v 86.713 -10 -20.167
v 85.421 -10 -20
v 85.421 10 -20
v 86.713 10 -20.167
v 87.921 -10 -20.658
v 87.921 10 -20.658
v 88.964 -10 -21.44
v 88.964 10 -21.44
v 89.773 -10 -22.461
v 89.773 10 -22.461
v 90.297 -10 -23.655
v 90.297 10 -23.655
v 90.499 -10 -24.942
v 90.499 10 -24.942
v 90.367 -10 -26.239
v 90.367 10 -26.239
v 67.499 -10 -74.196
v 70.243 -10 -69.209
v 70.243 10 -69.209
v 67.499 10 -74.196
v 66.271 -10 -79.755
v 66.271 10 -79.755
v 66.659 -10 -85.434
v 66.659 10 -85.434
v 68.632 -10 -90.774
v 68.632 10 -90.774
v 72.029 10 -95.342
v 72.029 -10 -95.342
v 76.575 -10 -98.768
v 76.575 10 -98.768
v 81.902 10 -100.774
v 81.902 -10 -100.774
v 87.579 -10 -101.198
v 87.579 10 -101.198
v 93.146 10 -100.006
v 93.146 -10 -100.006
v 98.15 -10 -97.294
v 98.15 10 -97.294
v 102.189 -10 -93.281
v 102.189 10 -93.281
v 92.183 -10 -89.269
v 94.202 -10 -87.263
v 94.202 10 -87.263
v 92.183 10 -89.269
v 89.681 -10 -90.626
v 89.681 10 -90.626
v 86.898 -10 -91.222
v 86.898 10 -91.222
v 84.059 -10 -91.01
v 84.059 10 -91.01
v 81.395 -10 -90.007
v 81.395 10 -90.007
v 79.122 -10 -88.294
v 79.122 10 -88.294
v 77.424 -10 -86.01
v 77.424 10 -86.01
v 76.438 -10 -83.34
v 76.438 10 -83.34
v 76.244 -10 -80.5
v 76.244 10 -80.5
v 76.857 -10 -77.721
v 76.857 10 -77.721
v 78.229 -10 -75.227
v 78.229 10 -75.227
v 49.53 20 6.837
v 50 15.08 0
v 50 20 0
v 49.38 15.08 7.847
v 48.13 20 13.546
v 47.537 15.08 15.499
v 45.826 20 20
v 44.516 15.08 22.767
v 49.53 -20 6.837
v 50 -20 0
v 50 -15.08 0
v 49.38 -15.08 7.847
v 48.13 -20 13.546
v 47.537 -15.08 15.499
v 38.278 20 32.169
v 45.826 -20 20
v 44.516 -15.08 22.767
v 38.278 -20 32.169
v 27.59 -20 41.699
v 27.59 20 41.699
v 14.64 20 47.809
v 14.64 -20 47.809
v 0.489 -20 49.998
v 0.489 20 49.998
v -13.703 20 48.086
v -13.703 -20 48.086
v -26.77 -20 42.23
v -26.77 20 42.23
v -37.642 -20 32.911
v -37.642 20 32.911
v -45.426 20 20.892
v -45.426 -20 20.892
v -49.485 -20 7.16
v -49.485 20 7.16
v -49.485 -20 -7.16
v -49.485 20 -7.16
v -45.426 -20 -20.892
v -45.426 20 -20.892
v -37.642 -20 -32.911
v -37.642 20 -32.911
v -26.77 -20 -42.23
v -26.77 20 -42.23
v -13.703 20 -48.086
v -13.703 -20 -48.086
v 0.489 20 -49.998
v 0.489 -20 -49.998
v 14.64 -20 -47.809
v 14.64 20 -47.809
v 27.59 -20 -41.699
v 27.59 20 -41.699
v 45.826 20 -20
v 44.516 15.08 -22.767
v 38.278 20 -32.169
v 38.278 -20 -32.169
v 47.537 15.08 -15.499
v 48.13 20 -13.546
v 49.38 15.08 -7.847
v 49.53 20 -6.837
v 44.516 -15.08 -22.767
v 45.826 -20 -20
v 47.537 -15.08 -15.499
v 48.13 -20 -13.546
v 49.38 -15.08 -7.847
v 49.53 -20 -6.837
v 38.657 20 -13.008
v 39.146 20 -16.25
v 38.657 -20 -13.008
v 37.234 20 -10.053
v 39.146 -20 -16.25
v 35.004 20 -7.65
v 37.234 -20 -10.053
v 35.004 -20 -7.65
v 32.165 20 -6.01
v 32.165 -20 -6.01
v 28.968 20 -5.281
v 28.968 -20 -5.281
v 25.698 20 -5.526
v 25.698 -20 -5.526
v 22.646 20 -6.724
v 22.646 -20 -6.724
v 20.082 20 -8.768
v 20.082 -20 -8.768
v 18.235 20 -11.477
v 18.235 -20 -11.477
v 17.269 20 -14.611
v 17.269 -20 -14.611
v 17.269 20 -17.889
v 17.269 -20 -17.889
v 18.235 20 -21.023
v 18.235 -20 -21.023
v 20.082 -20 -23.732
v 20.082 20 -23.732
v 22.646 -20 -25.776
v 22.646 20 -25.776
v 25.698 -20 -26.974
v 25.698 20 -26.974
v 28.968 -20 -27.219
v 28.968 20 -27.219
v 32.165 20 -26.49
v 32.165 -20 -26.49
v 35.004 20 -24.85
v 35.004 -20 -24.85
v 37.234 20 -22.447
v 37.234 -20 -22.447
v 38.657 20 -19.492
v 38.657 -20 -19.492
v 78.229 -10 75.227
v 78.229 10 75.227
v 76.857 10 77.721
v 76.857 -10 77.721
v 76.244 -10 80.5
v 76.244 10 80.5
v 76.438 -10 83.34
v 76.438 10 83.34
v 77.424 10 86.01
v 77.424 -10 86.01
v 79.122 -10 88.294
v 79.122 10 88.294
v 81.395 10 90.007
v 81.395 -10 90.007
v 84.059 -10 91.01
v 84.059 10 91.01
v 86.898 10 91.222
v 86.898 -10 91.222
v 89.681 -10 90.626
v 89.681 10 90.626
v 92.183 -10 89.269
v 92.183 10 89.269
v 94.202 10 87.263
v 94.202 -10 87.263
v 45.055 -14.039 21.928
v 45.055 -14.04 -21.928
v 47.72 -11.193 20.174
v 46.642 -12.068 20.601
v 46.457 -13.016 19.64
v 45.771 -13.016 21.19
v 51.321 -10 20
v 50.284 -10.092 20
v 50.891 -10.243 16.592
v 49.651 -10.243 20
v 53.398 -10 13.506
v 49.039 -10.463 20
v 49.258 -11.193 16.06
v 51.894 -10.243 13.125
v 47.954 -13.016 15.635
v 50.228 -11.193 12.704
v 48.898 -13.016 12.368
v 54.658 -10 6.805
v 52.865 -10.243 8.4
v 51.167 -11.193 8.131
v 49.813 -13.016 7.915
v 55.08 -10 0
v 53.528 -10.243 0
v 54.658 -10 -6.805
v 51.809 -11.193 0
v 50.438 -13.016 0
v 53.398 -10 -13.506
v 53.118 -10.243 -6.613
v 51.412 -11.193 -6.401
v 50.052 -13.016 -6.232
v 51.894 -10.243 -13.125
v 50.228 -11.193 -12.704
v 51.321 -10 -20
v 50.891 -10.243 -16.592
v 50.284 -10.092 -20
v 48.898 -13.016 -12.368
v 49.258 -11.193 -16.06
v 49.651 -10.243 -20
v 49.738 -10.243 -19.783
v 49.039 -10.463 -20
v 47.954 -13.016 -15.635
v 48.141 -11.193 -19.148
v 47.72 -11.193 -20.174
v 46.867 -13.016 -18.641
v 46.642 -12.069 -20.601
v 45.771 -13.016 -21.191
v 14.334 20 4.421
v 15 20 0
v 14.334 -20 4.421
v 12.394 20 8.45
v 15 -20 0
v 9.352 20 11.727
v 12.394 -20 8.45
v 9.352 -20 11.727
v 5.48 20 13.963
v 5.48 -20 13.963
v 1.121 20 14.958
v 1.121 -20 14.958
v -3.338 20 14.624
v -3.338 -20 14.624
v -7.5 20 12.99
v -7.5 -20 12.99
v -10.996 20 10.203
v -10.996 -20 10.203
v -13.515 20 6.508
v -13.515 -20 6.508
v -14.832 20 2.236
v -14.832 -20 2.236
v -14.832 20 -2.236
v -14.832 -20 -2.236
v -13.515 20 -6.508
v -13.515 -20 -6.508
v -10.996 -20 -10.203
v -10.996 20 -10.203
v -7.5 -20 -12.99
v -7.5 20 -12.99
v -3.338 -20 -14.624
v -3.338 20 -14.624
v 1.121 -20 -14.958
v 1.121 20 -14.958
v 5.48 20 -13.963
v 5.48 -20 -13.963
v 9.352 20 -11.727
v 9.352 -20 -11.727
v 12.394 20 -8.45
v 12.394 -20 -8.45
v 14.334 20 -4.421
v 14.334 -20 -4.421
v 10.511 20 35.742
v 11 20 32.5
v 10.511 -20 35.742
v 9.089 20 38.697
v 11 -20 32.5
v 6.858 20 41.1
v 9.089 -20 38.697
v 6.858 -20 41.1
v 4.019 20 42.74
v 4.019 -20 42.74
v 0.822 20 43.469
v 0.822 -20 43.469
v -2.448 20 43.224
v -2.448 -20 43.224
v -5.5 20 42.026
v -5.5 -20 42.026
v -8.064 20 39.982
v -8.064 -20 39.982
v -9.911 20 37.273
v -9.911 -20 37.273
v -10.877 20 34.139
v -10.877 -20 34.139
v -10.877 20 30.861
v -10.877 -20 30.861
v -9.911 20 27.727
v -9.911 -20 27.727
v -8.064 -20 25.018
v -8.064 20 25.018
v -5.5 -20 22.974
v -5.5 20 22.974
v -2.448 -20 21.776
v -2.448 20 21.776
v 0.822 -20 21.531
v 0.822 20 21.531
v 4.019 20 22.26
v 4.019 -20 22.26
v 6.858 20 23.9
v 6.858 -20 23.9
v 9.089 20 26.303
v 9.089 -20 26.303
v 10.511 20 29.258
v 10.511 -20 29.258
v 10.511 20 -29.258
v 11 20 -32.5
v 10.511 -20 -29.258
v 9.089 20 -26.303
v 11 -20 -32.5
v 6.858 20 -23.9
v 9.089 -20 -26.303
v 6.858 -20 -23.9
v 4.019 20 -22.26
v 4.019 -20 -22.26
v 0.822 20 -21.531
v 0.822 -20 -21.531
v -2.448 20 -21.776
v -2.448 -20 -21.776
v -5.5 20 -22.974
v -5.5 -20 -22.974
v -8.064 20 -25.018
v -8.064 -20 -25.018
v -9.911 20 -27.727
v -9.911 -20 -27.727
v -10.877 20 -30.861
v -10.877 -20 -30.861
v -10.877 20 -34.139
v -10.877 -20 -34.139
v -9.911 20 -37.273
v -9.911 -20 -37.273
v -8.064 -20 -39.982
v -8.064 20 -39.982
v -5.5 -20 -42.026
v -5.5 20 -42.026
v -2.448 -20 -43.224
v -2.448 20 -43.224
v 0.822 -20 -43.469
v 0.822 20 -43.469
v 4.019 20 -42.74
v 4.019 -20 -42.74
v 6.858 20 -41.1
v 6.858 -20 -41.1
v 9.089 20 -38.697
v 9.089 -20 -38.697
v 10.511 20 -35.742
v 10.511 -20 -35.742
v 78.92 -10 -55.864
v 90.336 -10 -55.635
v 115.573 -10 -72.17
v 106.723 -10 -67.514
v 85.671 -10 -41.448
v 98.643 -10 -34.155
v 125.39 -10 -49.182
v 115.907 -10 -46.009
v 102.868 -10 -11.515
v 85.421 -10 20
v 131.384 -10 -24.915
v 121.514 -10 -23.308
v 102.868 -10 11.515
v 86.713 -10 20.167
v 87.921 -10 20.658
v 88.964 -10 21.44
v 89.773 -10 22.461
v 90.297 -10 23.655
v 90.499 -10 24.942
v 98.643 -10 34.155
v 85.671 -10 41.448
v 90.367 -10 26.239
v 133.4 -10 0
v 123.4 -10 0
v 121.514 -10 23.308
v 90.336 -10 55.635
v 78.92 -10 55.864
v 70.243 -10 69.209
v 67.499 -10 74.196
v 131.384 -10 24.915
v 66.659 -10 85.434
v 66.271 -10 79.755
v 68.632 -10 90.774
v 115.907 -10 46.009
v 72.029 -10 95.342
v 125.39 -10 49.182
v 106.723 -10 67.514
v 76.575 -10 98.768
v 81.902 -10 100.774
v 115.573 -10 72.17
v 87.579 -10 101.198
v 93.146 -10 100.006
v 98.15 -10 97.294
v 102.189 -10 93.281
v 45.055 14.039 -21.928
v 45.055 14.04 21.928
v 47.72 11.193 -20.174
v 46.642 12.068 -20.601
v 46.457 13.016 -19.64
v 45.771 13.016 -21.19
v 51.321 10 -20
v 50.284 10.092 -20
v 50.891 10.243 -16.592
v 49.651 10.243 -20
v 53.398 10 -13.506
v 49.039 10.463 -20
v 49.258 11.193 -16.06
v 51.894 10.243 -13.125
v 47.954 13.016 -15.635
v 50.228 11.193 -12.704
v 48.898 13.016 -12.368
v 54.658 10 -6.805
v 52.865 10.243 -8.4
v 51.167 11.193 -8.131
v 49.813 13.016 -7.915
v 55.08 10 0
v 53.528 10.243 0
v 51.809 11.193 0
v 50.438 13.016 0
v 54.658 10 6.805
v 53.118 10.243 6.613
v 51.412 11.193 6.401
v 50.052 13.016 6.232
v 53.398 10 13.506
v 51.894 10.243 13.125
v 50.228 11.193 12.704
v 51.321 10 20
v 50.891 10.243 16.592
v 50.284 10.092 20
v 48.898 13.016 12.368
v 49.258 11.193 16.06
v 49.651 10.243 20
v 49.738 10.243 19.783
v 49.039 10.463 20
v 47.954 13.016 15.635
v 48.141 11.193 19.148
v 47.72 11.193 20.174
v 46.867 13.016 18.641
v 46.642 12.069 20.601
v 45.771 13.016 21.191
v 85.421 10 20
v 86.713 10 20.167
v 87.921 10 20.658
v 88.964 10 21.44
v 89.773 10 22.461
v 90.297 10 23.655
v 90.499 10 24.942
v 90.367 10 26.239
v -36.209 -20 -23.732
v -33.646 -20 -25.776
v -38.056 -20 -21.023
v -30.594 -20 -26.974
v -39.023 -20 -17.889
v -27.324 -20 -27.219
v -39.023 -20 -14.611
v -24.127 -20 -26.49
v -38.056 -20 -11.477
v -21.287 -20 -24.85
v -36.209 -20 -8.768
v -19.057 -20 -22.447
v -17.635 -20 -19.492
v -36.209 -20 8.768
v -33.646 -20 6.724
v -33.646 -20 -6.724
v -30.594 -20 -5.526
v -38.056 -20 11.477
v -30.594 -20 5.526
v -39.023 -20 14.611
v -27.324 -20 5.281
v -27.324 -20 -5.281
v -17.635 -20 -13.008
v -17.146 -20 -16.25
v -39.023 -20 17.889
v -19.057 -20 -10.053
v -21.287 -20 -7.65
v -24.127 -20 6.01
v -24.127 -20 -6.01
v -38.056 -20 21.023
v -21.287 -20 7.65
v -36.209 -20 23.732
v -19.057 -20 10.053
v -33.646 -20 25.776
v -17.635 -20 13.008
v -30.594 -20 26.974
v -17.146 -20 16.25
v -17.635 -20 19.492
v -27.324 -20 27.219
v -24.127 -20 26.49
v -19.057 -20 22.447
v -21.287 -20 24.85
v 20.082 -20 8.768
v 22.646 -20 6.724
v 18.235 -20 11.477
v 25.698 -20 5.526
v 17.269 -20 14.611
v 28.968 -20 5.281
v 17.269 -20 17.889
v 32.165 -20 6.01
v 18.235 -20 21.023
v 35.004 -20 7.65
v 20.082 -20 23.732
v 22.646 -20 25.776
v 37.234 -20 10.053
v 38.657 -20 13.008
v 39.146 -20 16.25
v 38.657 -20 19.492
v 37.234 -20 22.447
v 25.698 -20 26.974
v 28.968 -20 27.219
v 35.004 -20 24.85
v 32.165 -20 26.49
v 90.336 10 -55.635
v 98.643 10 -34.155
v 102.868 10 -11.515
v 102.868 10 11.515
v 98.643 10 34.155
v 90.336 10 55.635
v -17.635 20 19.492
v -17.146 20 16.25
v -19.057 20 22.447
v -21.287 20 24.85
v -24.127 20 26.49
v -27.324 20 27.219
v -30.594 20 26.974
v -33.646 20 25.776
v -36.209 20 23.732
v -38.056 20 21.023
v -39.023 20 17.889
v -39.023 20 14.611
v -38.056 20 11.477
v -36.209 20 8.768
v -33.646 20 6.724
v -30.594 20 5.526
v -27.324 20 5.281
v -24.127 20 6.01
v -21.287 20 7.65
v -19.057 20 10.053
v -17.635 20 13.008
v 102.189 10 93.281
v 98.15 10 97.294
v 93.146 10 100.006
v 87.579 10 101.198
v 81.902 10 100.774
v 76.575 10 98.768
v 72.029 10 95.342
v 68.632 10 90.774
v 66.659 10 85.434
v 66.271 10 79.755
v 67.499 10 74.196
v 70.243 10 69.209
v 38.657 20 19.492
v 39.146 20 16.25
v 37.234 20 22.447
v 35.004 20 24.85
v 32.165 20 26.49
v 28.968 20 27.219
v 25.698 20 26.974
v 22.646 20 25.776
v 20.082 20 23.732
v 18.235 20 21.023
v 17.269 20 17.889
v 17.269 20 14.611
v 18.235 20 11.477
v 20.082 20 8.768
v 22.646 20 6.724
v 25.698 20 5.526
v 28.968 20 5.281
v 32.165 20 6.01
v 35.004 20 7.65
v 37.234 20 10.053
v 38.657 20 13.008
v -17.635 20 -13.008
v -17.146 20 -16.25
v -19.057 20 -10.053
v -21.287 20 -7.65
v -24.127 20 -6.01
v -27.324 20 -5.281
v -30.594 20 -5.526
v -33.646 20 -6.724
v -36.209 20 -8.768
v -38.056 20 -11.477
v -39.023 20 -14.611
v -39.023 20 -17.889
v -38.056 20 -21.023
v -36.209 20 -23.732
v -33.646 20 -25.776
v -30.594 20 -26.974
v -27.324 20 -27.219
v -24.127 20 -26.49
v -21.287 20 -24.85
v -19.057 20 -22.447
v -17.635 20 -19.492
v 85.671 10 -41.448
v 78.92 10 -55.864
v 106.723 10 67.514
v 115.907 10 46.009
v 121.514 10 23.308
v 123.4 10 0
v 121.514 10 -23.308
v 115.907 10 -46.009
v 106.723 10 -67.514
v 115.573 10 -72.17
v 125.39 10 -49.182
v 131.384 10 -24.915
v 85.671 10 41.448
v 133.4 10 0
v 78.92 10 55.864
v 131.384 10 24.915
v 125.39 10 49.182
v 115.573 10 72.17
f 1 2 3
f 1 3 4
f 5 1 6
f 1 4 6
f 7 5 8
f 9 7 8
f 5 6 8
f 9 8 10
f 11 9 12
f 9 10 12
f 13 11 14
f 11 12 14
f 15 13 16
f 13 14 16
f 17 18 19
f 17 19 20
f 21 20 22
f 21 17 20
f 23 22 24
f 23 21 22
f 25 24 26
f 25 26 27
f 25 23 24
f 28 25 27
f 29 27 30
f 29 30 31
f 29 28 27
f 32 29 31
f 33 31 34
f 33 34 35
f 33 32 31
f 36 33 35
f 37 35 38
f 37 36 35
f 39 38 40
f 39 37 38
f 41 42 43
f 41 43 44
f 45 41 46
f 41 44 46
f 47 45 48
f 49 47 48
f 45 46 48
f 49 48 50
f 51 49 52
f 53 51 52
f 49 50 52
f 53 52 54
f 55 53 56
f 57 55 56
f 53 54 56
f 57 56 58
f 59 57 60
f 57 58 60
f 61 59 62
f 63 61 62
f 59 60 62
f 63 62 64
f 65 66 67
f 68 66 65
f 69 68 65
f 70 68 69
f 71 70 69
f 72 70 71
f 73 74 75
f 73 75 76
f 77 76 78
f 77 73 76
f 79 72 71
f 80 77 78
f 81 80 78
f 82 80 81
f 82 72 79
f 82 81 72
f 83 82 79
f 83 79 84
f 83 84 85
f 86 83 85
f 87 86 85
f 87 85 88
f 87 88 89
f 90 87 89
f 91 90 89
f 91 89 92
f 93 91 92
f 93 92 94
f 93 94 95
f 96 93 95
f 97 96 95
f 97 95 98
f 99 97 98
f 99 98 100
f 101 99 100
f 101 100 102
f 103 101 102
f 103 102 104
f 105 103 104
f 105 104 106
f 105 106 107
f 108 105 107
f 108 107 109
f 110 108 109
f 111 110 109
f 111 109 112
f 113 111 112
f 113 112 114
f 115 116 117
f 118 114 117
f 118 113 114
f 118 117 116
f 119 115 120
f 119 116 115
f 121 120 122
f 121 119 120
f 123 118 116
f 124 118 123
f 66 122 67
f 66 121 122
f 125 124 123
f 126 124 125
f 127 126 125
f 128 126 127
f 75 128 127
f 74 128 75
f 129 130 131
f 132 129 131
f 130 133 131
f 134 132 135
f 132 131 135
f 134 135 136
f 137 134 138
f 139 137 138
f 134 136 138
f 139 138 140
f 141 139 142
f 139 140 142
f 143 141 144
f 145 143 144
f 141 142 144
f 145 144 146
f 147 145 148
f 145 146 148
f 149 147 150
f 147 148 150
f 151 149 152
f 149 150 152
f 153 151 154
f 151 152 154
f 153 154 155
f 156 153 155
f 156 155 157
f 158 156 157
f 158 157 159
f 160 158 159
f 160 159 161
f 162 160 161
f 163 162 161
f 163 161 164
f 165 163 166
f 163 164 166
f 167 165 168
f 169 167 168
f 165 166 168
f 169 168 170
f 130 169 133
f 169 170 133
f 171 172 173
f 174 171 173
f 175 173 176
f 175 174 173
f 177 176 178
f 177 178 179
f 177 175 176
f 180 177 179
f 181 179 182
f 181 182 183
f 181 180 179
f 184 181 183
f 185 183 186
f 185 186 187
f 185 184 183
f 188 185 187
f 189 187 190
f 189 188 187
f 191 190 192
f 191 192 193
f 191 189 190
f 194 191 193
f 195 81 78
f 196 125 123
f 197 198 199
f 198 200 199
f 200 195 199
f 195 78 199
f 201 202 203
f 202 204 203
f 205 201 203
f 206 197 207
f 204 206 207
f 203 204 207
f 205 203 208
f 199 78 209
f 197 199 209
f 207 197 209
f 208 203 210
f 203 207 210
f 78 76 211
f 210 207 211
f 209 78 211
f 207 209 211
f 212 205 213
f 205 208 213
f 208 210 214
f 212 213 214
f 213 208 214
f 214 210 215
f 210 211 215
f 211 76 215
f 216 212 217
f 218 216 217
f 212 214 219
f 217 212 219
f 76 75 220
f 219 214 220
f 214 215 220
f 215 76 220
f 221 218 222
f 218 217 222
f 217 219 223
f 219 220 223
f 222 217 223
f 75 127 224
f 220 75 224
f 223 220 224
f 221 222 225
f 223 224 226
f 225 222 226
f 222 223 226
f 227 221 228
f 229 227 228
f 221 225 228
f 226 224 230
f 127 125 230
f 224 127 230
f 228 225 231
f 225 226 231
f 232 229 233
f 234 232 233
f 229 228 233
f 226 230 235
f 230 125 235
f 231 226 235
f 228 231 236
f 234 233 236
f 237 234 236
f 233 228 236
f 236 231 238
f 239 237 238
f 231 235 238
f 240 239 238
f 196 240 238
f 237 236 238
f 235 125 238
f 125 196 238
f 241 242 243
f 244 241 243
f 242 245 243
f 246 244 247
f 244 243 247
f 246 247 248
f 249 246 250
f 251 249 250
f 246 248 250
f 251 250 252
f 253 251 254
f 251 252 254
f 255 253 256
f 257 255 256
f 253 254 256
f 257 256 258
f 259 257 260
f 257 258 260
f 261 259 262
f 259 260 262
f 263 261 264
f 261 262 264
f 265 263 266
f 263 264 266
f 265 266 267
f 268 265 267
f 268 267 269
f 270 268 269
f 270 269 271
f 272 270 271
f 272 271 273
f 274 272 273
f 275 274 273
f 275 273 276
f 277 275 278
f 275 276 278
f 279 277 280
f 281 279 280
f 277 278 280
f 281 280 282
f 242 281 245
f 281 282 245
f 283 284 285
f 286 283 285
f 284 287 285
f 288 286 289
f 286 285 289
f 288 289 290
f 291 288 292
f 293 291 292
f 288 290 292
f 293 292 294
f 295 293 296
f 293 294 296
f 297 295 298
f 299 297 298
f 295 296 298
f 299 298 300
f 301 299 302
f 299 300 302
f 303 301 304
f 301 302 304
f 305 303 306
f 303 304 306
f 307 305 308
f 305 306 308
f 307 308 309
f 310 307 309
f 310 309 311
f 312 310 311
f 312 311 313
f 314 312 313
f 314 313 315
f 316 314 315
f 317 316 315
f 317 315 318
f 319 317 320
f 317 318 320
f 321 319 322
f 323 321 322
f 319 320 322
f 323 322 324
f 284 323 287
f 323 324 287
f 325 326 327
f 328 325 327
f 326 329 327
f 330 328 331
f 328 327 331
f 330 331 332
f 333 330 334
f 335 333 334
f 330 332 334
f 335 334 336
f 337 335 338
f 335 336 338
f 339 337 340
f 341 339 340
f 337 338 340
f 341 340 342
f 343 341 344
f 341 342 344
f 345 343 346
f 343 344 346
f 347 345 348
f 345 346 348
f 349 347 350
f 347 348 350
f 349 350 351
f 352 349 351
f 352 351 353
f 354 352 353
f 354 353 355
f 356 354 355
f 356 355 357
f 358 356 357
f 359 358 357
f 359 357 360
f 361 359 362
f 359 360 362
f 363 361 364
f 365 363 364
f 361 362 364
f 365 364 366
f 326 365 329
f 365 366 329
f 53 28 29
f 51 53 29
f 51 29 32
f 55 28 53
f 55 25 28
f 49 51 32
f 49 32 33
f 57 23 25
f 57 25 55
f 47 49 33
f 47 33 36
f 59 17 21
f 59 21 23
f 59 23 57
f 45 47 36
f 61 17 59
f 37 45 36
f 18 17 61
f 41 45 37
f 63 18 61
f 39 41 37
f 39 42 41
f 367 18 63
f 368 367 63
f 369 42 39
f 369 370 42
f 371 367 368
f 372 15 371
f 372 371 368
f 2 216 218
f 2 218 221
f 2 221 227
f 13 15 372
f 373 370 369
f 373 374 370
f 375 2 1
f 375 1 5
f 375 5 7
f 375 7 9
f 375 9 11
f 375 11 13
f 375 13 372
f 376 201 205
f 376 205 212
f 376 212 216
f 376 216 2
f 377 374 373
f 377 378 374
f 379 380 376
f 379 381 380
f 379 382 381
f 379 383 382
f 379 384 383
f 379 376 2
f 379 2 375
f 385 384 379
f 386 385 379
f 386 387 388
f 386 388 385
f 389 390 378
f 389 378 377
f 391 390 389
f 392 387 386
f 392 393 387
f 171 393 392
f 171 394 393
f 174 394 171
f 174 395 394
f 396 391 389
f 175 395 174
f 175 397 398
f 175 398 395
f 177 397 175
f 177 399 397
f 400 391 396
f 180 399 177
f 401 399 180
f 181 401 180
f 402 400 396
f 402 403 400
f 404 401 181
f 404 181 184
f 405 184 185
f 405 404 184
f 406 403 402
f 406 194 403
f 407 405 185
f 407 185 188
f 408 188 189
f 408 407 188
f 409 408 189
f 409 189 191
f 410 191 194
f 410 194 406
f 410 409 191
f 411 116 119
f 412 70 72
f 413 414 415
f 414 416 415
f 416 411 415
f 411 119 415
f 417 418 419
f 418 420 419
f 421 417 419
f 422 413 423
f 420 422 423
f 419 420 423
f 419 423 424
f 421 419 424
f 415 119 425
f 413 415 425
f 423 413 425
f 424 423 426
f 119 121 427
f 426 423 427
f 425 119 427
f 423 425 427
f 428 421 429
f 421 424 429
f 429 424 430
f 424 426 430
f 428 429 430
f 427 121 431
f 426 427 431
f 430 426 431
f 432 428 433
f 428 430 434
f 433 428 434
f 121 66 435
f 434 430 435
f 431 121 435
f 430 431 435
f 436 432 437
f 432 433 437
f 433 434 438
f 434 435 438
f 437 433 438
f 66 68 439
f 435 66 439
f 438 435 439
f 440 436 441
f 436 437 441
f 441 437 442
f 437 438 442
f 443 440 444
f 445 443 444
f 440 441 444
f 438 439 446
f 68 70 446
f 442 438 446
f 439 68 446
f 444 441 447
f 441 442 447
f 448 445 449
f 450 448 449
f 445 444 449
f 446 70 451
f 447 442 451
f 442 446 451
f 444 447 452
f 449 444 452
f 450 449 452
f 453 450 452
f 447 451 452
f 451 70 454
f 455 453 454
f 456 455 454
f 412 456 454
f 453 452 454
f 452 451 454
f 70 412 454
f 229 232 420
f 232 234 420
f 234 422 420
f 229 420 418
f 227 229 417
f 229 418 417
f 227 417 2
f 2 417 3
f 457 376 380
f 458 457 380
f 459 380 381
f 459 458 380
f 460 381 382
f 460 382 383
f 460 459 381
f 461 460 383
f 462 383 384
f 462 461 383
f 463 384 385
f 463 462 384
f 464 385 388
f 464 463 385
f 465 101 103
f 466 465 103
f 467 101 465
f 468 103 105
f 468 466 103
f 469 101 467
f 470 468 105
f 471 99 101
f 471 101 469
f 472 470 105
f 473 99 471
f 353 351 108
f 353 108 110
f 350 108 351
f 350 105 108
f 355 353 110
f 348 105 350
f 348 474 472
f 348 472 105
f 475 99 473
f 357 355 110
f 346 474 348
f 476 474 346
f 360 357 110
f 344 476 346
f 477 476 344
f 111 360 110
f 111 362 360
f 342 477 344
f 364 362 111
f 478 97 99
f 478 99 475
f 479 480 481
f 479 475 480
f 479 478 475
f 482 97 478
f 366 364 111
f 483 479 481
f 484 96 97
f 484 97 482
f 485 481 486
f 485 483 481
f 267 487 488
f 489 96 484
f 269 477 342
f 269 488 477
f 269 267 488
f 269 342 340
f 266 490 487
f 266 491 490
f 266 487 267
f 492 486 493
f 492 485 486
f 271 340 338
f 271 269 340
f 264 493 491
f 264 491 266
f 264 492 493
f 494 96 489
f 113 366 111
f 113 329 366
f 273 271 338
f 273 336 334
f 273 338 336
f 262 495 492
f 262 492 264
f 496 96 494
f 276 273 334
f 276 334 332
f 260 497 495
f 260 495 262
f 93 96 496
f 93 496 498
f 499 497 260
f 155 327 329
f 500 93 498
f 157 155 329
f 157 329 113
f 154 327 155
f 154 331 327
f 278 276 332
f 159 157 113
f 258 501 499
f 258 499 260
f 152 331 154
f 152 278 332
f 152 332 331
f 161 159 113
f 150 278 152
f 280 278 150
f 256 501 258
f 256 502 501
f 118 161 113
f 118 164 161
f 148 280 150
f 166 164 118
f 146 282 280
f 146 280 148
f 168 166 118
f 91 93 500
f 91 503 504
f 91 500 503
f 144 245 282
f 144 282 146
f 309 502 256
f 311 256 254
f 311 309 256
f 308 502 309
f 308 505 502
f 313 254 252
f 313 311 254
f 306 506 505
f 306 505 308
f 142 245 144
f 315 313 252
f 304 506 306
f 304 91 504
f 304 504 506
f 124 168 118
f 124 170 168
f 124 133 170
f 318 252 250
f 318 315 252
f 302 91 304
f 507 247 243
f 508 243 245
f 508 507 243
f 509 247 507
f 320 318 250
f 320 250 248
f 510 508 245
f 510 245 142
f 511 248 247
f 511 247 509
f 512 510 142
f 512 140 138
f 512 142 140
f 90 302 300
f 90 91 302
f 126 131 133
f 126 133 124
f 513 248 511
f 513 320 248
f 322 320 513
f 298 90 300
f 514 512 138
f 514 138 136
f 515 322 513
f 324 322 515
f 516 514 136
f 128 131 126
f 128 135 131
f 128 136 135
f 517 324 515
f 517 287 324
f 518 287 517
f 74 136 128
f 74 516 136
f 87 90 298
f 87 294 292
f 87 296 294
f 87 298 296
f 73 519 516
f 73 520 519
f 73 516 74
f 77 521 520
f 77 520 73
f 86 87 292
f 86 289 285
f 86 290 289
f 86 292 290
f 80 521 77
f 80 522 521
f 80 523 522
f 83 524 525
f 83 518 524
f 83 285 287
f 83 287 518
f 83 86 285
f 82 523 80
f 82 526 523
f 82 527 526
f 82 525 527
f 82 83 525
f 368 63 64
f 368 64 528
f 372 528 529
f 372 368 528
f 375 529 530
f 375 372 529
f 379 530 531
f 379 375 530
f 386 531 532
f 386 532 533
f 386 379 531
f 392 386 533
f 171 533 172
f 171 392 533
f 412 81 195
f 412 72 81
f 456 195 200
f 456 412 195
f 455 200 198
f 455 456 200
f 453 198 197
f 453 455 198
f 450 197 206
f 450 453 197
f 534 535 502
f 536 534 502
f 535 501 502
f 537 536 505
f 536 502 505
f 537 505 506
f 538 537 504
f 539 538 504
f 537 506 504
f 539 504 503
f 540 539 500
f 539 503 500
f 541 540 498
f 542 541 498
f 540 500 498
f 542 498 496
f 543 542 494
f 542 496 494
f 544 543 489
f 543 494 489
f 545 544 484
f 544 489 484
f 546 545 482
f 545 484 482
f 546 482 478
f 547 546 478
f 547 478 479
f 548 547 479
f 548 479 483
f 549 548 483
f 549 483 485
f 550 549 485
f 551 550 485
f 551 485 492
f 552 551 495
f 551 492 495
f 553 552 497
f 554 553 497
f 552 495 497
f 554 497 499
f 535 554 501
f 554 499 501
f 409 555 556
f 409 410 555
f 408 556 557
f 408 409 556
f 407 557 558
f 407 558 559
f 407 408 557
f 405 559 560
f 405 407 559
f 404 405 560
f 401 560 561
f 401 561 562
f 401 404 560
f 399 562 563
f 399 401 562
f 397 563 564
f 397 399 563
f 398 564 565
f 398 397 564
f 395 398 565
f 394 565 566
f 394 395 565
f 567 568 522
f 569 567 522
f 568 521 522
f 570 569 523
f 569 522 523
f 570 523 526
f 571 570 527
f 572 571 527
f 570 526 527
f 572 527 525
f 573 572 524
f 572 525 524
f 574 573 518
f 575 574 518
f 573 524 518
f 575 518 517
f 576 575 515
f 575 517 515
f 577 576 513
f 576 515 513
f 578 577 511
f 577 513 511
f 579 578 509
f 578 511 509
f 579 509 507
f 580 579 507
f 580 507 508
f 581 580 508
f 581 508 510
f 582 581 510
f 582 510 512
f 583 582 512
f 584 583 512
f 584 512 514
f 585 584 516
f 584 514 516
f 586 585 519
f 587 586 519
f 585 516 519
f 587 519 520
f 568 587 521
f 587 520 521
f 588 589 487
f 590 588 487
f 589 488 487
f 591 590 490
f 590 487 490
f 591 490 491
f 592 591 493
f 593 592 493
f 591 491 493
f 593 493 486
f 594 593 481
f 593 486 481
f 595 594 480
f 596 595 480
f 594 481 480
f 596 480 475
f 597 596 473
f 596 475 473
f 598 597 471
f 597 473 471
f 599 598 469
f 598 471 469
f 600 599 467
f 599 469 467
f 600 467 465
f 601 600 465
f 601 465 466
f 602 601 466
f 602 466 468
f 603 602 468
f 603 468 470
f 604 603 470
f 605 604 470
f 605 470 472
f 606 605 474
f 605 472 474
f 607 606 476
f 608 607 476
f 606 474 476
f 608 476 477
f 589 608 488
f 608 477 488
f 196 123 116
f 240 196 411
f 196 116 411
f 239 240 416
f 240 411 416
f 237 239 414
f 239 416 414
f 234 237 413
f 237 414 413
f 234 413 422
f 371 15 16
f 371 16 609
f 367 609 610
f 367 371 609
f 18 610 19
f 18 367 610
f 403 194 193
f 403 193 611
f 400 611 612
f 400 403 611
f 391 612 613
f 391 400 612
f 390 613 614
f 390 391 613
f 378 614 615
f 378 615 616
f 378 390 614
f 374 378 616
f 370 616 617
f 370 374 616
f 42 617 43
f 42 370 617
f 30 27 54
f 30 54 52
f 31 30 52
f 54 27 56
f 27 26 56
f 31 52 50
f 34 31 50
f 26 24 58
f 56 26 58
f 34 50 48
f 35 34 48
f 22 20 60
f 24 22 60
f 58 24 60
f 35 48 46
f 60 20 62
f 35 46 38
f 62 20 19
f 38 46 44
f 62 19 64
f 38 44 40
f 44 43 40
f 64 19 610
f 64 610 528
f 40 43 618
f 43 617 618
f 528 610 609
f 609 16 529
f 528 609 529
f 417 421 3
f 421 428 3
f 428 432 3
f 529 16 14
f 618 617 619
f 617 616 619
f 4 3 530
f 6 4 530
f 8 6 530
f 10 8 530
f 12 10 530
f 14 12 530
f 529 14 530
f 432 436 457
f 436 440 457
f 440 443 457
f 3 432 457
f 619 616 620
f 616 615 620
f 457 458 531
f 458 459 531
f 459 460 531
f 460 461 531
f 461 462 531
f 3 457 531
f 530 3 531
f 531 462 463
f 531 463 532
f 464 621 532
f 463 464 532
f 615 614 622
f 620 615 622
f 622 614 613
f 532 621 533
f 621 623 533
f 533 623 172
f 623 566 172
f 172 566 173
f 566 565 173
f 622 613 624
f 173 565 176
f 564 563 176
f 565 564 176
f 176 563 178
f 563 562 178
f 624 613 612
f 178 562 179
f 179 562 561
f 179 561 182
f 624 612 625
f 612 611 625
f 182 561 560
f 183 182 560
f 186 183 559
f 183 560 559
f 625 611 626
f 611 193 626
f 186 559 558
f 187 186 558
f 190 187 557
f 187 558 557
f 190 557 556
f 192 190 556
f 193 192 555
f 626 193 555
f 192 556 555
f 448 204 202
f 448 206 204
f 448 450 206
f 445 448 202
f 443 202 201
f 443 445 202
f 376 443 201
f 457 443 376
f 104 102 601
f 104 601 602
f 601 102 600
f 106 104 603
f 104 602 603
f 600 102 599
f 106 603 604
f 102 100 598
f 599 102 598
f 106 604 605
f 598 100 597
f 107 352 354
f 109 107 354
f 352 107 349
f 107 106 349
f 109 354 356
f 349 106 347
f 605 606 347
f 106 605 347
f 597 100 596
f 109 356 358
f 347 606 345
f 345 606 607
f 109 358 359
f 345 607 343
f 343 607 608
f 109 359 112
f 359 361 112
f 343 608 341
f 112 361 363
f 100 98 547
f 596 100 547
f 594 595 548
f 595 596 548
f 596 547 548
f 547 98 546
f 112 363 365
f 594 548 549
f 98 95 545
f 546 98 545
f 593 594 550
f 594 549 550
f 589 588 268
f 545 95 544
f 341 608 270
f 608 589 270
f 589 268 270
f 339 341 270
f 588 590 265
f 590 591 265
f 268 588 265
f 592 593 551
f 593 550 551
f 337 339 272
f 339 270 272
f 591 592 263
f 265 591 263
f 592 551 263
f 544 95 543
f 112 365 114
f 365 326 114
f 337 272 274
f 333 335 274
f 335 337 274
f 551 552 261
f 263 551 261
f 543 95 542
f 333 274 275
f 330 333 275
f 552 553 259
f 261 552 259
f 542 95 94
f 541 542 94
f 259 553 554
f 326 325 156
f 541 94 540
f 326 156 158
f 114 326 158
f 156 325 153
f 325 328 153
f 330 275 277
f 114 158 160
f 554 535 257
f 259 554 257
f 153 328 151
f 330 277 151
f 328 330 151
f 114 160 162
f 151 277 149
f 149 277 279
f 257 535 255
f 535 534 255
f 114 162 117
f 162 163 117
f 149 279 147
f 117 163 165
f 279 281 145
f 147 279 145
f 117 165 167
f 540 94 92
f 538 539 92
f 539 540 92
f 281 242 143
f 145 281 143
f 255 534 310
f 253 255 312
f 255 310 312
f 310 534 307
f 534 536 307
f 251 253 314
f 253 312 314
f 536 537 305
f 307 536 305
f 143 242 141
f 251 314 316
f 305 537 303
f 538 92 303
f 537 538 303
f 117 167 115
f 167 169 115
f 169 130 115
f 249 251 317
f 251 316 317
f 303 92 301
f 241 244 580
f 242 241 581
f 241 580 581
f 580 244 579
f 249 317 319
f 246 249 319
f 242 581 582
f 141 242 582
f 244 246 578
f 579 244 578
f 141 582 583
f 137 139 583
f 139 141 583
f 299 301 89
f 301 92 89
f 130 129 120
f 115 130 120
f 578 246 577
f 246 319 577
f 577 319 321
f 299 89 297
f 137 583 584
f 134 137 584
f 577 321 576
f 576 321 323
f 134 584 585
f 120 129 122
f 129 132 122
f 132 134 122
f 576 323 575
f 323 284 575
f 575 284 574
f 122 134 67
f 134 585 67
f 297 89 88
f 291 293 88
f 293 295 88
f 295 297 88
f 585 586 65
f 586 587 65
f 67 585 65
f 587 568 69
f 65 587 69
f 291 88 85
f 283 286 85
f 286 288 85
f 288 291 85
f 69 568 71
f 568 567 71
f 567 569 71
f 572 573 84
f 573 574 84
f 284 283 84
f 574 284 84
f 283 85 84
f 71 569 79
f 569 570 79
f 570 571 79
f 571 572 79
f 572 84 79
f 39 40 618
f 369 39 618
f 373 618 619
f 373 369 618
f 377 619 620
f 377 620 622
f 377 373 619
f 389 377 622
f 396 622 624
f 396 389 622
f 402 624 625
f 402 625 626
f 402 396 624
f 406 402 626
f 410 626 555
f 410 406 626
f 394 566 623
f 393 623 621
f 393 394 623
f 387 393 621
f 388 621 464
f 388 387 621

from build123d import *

# Parameters (mm, degrees)
F0_R         = 11
F0_R_2       = 15
F1_DEPTH     = 20
F2_DEPTH     = 10
F3_T1_DEPTH  = 10
F3_T3_DEPTH  = 10
F3_T5_DEPTH  = 20
F3_T10_ANGLE = 38.1317076079
F3_T15_ANGLE = 38.1317076079
F3_T20_ANGLE = 38.1317076079
F3_T25_ANGLE = 38.1317076079
F3_T31_DEPTH = 18.0325080763
F3_T35_ANGLE = 38.1317076079
F3_T42_DEPTH = 18.0325080763
F3_T46_ANGLE = 38.1317076079
F3_T53_DEPTH = 18.0325080763
F3_T57_ANGLE = 38.1317076079
F3_T64_DEPTH = 18.0325080763
F3_T68_ANGLE = 38.1317076079


# Not quite as in the source:
# - a fillet or chamfer that OpenCascade refuses, or shapes differently, is made with other operations: its cross-section is extruded or revolved along the edge and cut away or added


with BuildPart() as f1:
    # F0 (on Front) → F1 (new body, symmetric)
    with BuildSketch(Plane.XZ):
        with BuildLine():
            ThreePointArc((45.8257569496, -20), (48.9453156465, -10.2154821845), (50, 0))
            ThreePointArc((50, 0), (48.9453156465, 10.2154821845), (45.8257569496, 20))
            ThreePointArc((45.8257569496, 20), (-50, 0), (45.8257569496, -20))
        make_face()
        with Locations((-28.145825623, -16.25)):
            Circle(F0_R, mode=Mode.SUBTRACT)
        with Locations((0, -32.5)):
            Circle(F0_R, mode=Mode.SUBTRACT)
        with Locations((28.145825623, -16.25)):
            Circle(F0_R, mode=Mode.SUBTRACT)
        with Locations((-28.145825623, 16.25)):
            Circle(F0_R, mode=Mode.SUBTRACT)
        Circle(F0_R_2, mode=Mode.SUBTRACT)
        with Locations((28.145825623, 16.25)):
            Circle(F0_R, mode=Mode.SUBTRACT)
        with Locations((0, 32.5)):
            Circle(F0_R, mode=Mode.SUBTRACT)
    extrude(amount=F1_DEPTH, both=True)

    # F0 (on Front) → F2 (join, symmetric)
    with BuildSketch(Plane.XZ):
        with BuildLine():
            ThreePointArc((45.8257569496, -20), (48.9453156465, -10.2154821845), (50, 0))
            ThreePointArc((50, 0), (48.9453156465, 10.2154821845), (45.8257569496, 20))
            ThreePointArc((45.8257569496, 20), (-50, 0), (45.8257569496, -20))
        make_face()
        with Locations((-28.145825623, -16.25)):
            Circle(F0_R, mode=Mode.SUBTRACT)
        with Locations((0, -32.5)):
            Circle(F0_R, mode=Mode.SUBTRACT)
        with Locations((28.145825623, -16.25)):
            Circle(F0_R, mode=Mode.SUBTRACT)
        with Locations((-28.145825623, 16.25)):
            Circle(F0_R, mode=Mode.SUBTRACT)
        Circle(F0_R_2, mode=Mode.SUBTRACT)
        with Locations((28.145825623, 16.25)):
            Circle(F0_R, mode=Mode.SUBTRACT)
        with Locations((0, 32.5)):
            Circle(F0_R, mode=Mode.SUBTRACT)
        with BuildLine():
            ThreePointArc((45.8257569496, 20), (48.9453156465, 10.2154821845), (50, 0))
            ThreePointArc((50, 0), (48.9453156465, -10.2154821845), (45.8257569496, -20))
            Line((45.8257569496, -20), (91.6475165291, -20))
            ThreePointArc((91.6475165291, -20), (83.8557409084, -45.8703249329), (70.2430836554, -69.2087276625))
            ThreePointArc((70.2430836554, -69.2087276625), (74.1794933933, -97.2177383265), (102.1885040573, -93.2813285886))
            ThreePointArc((102.1885040573, -93.2813285886), (133.4, 0), (102.1885040573, 93.2813285886))
            ThreePointArc((102.1885040573, 93.2813285886), (74.1794933933, 97.2177383265), (70.2430836554, 69.2087276625))
            ThreePointArc((70.2430836554, 69.2087276625), (83.8557409084, 45.8703249329), (91.6475165291, 20))
            Line((91.6475165291, 20), (45.8257569496, 20))
        make_face()
        with BuildLine():
            ThreePointArc((94.2021489569, -87.263178357), (80.1976436249, -89.231383226), (78.2294387559, -75.226877894))
            ThreePointArc((78.2294387559, -75.226877894), (103.4, 0), (78.2294387559, 75.226877894))
            ThreePointArc((78.2294387559, 75.226877894), (80.1976436249, 89.231383226), (94.2021489569, 87.263178357))
            ThreePointArc((94.2021489569, 87.263178357), (123.4, 0), (94.2021489569, -87.263178357))
        make_face(mode=Mode.SUBTRACT)
    extrude(amount=F2_DEPTH, both=True)

    # F3: fillet of radius 5.08 on 10 edges, made by hand

    # F3_s2 → F3_t1 (join)
    with BuildSketch(Plane.XZ.offset(-10)):
        with BuildLine():
            ThreePointArc((44.5159406137, 22.7668845316), (46.3877440145, 20.7465818007), (49.0387601801, 20))
            Line((49.0387601801, 20), (45.8257569496, 20))
            ThreePointArc((45.8257569496, 20), (45.1920290777, 21.3934688128), (44.5159406137, 22.7668845316))
        make_face()
        with BuildLine():
            ThreePointArc((44.5159406137, -22.7668845316), (46.3877440145, -20.7465818007), (49.0387601801, -20))
            Line((49.0387601801, -20), (45.8257569496, -20))
            ThreePointArc((45.8257569496, -20), (45.1920290777, -21.3934688128), (44.5159406137, -22.7668845316))
        make_face()
    extrude(amount=F3_T1_DEPTH)

    # F3_s4 → F3_t3 (join)
    with BuildSketch(Plane.XZ):
        with BuildLine():
            ThreePointArc((44.5159406137, 22.7668845316), (46.3877440145, 20.7465818007), (49.0387601801, 20))
            Line((49.0387601801, 20), (45.8257569496, 20))
            ThreePointArc((45.8257569496, 20), (45.1920290777, 21.3934688128), (44.5159406137, 22.7668845316))
        make_face()
        with BuildLine():
            ThreePointArc((44.5159406137, -22.7668845316), (46.3877440145, -20.7465818007), (49.0387601801, -20))
            Line((49.0387601801, -20), (45.8257569496, -20))
            ThreePointArc((45.8257569496, -20), (45.1920290777, -21.3934688128), (44.5159406137, -22.7668845316))
        make_face()
    extrude(amount=F3_T3_DEPTH)

    # F3_s6 → F3_t5 (join)
    with BuildSketch(Plane.XZ.offset(-10)):
        with BuildLine():
            ThreePointArc((85.4205587726, -20), (89.4014218376, -21.924191188), (90.3665598512, -26.2390829694))
            ThreePointArc((90.3665598512, -26.2390829694), (91.0502400753, -23.1284113368), (91.6475165291, -20))
            Line((91.6475165291, -20), (85.4205587726, -20))
        make_face()
        with BuildLine():
            ThreePointArc((85.4205587726, 20), (89.4014218376, 21.924191188), (90.3665598512, 26.2390829694))
            ThreePointArc((90.3665598512, 26.2390829694), (91.0502400753, 23.1284113368), (91.6475165291, 20))
            Line((91.6475165291, 20), (85.4205587726, 20))
        make_face()
    extrude(amount=F3_T5_DEPTH)


with BuildPart() as f3_tool8:
    # F3_s9 → F3_t10 (revolve)
    with BuildSketch(Plane(origin=(0, 0, 0), x_dir=(0, 1, 0), z_dir=(-0.6174712722, 0, -0.7865934325))):
        with BuildLine():
            ThreePointArc((10, 55.08), (11.4878975516, 51.4878975516), (15.08, 50))
            Line((15.08, 50), (10, 50))
            Line((10, 50), (10, 55.08))
        make_face()
    revolve(axis=Axis((0, 10, 0), (0, -1, 0)), revolution_arc=F3_T10_ANGLE)

    split(bisect_by=Plane.XY.offset(-20), keep=Keep.TOP)


with BuildPart() as f1_1:
    add(f1.part)

    # F3_t7: union F3_tool8
    add(f3_tool8.part)


with BuildPart() as f3_tool13:
    # F3_s14 → F3_t15 (revolve)
    with BuildSketch(Plane.XY):
        with BuildLine():
            ThreePointArc((55.08, 10), (51.4878975516, 11.4878975516), (50, 15.08))
            Line((50, 15.08), (50, 10))
            Line((50, 10), (55.08, 10))
        make_face()
    revolve(axis=Axis((0, 10, 0), (0, -1, 0)), revolution_arc=F3_T15_ANGLE)

    split(bisect_by=Plane.XY.offset(20), keep=Keep.BOTTOM)


with BuildPart() as f1_2:
    add(f1_1.part)

    # F3_t12: union F3_tool13
    add(f3_tool13.part)


with BuildPart() as f3_tool18:
    # F3_s19 → F3_t20 (revolve)
    with BuildSketch(Plane.XY):
        with BuildLine():
            ThreePointArc((55.08, -10), (51.4878975516, -11.4878975516), (50, -15.08))
            Line((50, -15.08), (50, -10))
            Line((50, -10), (55.08, -10))
        make_face()
    revolve(axis=Axis((0, -10, 0), (0, 1, 0)), revolution_arc=F3_T20_ANGLE)

    split(bisect_by=Plane.XY.offset(-20), keep=Keep.TOP)


with BuildPart() as f1_3:
    add(f1_2.part)

    # F3_t17: union F3_tool18
    add(f3_tool18.part)


with BuildPart() as f3_tool23:
    # F3_s24 → F3_t25 (revolve)
    with BuildSketch(Plane(origin=(0, 0, 0), x_dir=(0, 1, 0), z_dir=(-0.6174712722, 0, 0.7865934325))):
        with BuildLine():
            ThreePointArc((-10, -55.08), (-11.4878975516, -51.4878975516), (-15.08, -50))
            Line((-15.08, -50), (-10, -50))
            Line((-10, -50), (-10, -55.08))
        make_face()
    revolve(axis=Axis((0, -10, 0), (0, 1, 0)), revolution_arc=F3_T25_ANGLE)

    split(bisect_by=Plane.XY.offset(20), keep=Keep.BOTTOM)


with BuildPart() as f1_4:
    add(f1_3.part)

    # F3_t22: union F3_tool23
    add(f3_tool23.part)


with BuildPart() as f3_tool29:
    # F3_s30 → F3_t31 (new body)
    with BuildSketch(Plane.XZ):
        with BuildLine():
            ThreePointArc((44.5159406137, 22.7668845316), (46.3877440145, 20.7465818007), (49.0387601801, 20))
            Line((49.0387601801, 20), (45.8257569496, 20))
            ThreePointArc((45.8257569496, 20), (45.1920290777, 21.3934688128), (44.5159406137, 22.7668845316))
        make_face()
    extrude(amount=-F3_T31_DEPTH)

    split(bisect_by=Plane.XZ.offset(-10), keep=Keep.BOTTOM)


with BuildPart() as f3_tool33:
    # F3_s34 → F3_t35 (revolve)
    with BuildSketch(Plane.XY):
        with BuildLine():
            ThreePointArc((55.08, 10), (51.4878975516, 11.4878975516), (50, 15.08))
            Line((50, 15.08), (50, 10))
            Line((50, 10), (55.08, 10))
        make_face()
    revolve(axis=Axis((0, 10, 0), (0, -1, 0)), revolution_arc=F3_T35_ANGLE)

    split(bisect_by=Plane.XY.offset(20), keep=Keep.TOP)


with BuildPart() as f3_tool29_1:
    add(f3_tool29.part)

    # F3_t37: intersect F3_tool33
    add(f3_tool33.part, mode=Mode.INTERSECT)


with BuildPart() as f1_5:
    add(f1_4.part)

    # F3_t27: union F3_tool29
    add(f3_tool29_1.part)


with BuildPart() as f3_tool40:
    # F3_s41 → F3_t42 (new body)
    with BuildSketch(Plane.XZ):
        with BuildLine():
            ThreePointArc((44.5159406137, 22.7668845316), (46.3877440145, 20.7465818007), (49.0387601801, 20))
            Line((49.0387601801, 20), (45.8257569496, 20))
            ThreePointArc((45.8257569496, 20), (45.1920290777, 21.3934688128), (44.5159406137, 22.7668845316))
        make_face()
    extrude(amount=F3_T42_DEPTH)

    split(bisect_by=Plane.XZ.offset(10), keep=Keep.TOP)


with BuildPart() as f3_tool44:
    # F3_s45 → F3_t46 (revolve)
    with BuildSketch(Plane(origin=(0, 0, 0), x_dir=(0, 1, 0), z_dir=(-0.6174712722, 0, 0.7865934325))):
        with BuildLine():
            ThreePointArc((-10, -55.08), (-11.4878975516, -51.4878975516), (-15.08, -50))
            Line((-15.08, -50), (-10, -50))
            Line((-10, -50), (-10, -55.08))
        make_face()
    revolve(axis=Axis((0, -10, 0), (0, 1, 0)), revolution_arc=F3_T46_ANGLE)

    split(bisect_by=Plane.XY.offset(20), keep=Keep.TOP)


with BuildPart() as f3_tool40_1:
    add(f3_tool40.part)

    # F3_t48: intersect F3_tool44
    add(f3_tool44.part, mode=Mode.INTERSECT)


with BuildPart() as f1_6:
    add(f1_5.part)

    # F3_t38: union F3_tool40
    add(f3_tool40_1.part)


with BuildPart() as f3_tool51:
    # F3_s52 → F3_t53 (new body)
    with BuildSketch(Plane.XZ):
        with BuildLine():
            ThreePointArc((44.5159406137, -22.7668845316), (46.3877440145, -20.7465818007), (49.0387601801, -20))
            Line((49.0387601801, -20), (45.8257569496, -20))
            ThreePointArc((45.8257569496, -20), (45.1920290777, -21.3934688128), (44.5159406137, -22.7668845316))
        make_face()
    extrude(amount=-F3_T53_DEPTH)

    split(bisect_by=Plane.XZ.offset(-10), keep=Keep.BOTTOM)


with BuildPart() as f3_tool55:
    # F3_s56 → F3_t57 (revolve)
    with BuildSketch(Plane(origin=(0, 0, 0), x_dir=(0, 1, 0), z_dir=(-0.6174712722, 0, -0.7865934325))):
        with BuildLine():
            ThreePointArc((10, 55.08), (11.4878975516, 51.4878975516), (15.08, 50))
            Line((15.08, 50), (10, 50))
            Line((10, 50), (10, 55.08))
        make_face()
    revolve(axis=Axis((0, 10, 0), (0, -1, 0)), revolution_arc=F3_T57_ANGLE)

    split(bisect_by=Plane.XY.offset(-20), keep=Keep.BOTTOM)


with BuildPart() as f3_tool51_1:
    add(f3_tool51.part)

    # F3_t59: intersect F3_tool55
    add(f3_tool55.part, mode=Mode.INTERSECT)


with BuildPart() as f1_7:
    add(f1_6.part)

    # F3_t49: union F3_tool51
    add(f3_tool51_1.part)


with BuildPart() as f3_tool62:
    # F3_s63 → F3_t64 (new body)
    with BuildSketch(Plane.XZ):
        with BuildLine():
            ThreePointArc((44.5159406137, -22.7668845316), (46.3877440145, -20.7465818007), (49.0387601801, -20))
            Line((49.0387601801, -20), (45.8257569496, -20))
            ThreePointArc((45.8257569496, -20), (45.1920290777, -21.3934688128), (44.5159406137, -22.7668845316))
        make_face()
    extrude(amount=F3_T64_DEPTH)

    split(bisect_by=Plane.XZ.offset(10), keep=Keep.TOP)


with BuildPart() as f3_tool66:
    # F3_s67 → F3_t68 (revolve)
    with BuildSketch(Plane.XY):
        with BuildLine():
            ThreePointArc((55.08, -10), (51.4878975516, -11.4878975516), (50, -15.08))
            Line((50, -15.08), (50, -10))
            Line((50, -10), (55.08, -10))
        make_face()
    revolve(axis=Axis((0, -10, 0), (0, 1, 0)), revolution_arc=F3_T68_ANGLE)

    split(bisect_by=Plane.XY.offset(-20), keep=Keep.BOTTOM)


with BuildPart() as f3_tool62_1:
    add(f3_tool62.part)

    # F3_t70: intersect F3_tool66
    add(f3_tool66.part, mode=Mode.INTERSECT)


with BuildPart() as f1_8:
    add(f1_7.part)

    # F3_t60: union F3_tool62
    add(f3_tool62_1.part)


solid = f1_8.part
